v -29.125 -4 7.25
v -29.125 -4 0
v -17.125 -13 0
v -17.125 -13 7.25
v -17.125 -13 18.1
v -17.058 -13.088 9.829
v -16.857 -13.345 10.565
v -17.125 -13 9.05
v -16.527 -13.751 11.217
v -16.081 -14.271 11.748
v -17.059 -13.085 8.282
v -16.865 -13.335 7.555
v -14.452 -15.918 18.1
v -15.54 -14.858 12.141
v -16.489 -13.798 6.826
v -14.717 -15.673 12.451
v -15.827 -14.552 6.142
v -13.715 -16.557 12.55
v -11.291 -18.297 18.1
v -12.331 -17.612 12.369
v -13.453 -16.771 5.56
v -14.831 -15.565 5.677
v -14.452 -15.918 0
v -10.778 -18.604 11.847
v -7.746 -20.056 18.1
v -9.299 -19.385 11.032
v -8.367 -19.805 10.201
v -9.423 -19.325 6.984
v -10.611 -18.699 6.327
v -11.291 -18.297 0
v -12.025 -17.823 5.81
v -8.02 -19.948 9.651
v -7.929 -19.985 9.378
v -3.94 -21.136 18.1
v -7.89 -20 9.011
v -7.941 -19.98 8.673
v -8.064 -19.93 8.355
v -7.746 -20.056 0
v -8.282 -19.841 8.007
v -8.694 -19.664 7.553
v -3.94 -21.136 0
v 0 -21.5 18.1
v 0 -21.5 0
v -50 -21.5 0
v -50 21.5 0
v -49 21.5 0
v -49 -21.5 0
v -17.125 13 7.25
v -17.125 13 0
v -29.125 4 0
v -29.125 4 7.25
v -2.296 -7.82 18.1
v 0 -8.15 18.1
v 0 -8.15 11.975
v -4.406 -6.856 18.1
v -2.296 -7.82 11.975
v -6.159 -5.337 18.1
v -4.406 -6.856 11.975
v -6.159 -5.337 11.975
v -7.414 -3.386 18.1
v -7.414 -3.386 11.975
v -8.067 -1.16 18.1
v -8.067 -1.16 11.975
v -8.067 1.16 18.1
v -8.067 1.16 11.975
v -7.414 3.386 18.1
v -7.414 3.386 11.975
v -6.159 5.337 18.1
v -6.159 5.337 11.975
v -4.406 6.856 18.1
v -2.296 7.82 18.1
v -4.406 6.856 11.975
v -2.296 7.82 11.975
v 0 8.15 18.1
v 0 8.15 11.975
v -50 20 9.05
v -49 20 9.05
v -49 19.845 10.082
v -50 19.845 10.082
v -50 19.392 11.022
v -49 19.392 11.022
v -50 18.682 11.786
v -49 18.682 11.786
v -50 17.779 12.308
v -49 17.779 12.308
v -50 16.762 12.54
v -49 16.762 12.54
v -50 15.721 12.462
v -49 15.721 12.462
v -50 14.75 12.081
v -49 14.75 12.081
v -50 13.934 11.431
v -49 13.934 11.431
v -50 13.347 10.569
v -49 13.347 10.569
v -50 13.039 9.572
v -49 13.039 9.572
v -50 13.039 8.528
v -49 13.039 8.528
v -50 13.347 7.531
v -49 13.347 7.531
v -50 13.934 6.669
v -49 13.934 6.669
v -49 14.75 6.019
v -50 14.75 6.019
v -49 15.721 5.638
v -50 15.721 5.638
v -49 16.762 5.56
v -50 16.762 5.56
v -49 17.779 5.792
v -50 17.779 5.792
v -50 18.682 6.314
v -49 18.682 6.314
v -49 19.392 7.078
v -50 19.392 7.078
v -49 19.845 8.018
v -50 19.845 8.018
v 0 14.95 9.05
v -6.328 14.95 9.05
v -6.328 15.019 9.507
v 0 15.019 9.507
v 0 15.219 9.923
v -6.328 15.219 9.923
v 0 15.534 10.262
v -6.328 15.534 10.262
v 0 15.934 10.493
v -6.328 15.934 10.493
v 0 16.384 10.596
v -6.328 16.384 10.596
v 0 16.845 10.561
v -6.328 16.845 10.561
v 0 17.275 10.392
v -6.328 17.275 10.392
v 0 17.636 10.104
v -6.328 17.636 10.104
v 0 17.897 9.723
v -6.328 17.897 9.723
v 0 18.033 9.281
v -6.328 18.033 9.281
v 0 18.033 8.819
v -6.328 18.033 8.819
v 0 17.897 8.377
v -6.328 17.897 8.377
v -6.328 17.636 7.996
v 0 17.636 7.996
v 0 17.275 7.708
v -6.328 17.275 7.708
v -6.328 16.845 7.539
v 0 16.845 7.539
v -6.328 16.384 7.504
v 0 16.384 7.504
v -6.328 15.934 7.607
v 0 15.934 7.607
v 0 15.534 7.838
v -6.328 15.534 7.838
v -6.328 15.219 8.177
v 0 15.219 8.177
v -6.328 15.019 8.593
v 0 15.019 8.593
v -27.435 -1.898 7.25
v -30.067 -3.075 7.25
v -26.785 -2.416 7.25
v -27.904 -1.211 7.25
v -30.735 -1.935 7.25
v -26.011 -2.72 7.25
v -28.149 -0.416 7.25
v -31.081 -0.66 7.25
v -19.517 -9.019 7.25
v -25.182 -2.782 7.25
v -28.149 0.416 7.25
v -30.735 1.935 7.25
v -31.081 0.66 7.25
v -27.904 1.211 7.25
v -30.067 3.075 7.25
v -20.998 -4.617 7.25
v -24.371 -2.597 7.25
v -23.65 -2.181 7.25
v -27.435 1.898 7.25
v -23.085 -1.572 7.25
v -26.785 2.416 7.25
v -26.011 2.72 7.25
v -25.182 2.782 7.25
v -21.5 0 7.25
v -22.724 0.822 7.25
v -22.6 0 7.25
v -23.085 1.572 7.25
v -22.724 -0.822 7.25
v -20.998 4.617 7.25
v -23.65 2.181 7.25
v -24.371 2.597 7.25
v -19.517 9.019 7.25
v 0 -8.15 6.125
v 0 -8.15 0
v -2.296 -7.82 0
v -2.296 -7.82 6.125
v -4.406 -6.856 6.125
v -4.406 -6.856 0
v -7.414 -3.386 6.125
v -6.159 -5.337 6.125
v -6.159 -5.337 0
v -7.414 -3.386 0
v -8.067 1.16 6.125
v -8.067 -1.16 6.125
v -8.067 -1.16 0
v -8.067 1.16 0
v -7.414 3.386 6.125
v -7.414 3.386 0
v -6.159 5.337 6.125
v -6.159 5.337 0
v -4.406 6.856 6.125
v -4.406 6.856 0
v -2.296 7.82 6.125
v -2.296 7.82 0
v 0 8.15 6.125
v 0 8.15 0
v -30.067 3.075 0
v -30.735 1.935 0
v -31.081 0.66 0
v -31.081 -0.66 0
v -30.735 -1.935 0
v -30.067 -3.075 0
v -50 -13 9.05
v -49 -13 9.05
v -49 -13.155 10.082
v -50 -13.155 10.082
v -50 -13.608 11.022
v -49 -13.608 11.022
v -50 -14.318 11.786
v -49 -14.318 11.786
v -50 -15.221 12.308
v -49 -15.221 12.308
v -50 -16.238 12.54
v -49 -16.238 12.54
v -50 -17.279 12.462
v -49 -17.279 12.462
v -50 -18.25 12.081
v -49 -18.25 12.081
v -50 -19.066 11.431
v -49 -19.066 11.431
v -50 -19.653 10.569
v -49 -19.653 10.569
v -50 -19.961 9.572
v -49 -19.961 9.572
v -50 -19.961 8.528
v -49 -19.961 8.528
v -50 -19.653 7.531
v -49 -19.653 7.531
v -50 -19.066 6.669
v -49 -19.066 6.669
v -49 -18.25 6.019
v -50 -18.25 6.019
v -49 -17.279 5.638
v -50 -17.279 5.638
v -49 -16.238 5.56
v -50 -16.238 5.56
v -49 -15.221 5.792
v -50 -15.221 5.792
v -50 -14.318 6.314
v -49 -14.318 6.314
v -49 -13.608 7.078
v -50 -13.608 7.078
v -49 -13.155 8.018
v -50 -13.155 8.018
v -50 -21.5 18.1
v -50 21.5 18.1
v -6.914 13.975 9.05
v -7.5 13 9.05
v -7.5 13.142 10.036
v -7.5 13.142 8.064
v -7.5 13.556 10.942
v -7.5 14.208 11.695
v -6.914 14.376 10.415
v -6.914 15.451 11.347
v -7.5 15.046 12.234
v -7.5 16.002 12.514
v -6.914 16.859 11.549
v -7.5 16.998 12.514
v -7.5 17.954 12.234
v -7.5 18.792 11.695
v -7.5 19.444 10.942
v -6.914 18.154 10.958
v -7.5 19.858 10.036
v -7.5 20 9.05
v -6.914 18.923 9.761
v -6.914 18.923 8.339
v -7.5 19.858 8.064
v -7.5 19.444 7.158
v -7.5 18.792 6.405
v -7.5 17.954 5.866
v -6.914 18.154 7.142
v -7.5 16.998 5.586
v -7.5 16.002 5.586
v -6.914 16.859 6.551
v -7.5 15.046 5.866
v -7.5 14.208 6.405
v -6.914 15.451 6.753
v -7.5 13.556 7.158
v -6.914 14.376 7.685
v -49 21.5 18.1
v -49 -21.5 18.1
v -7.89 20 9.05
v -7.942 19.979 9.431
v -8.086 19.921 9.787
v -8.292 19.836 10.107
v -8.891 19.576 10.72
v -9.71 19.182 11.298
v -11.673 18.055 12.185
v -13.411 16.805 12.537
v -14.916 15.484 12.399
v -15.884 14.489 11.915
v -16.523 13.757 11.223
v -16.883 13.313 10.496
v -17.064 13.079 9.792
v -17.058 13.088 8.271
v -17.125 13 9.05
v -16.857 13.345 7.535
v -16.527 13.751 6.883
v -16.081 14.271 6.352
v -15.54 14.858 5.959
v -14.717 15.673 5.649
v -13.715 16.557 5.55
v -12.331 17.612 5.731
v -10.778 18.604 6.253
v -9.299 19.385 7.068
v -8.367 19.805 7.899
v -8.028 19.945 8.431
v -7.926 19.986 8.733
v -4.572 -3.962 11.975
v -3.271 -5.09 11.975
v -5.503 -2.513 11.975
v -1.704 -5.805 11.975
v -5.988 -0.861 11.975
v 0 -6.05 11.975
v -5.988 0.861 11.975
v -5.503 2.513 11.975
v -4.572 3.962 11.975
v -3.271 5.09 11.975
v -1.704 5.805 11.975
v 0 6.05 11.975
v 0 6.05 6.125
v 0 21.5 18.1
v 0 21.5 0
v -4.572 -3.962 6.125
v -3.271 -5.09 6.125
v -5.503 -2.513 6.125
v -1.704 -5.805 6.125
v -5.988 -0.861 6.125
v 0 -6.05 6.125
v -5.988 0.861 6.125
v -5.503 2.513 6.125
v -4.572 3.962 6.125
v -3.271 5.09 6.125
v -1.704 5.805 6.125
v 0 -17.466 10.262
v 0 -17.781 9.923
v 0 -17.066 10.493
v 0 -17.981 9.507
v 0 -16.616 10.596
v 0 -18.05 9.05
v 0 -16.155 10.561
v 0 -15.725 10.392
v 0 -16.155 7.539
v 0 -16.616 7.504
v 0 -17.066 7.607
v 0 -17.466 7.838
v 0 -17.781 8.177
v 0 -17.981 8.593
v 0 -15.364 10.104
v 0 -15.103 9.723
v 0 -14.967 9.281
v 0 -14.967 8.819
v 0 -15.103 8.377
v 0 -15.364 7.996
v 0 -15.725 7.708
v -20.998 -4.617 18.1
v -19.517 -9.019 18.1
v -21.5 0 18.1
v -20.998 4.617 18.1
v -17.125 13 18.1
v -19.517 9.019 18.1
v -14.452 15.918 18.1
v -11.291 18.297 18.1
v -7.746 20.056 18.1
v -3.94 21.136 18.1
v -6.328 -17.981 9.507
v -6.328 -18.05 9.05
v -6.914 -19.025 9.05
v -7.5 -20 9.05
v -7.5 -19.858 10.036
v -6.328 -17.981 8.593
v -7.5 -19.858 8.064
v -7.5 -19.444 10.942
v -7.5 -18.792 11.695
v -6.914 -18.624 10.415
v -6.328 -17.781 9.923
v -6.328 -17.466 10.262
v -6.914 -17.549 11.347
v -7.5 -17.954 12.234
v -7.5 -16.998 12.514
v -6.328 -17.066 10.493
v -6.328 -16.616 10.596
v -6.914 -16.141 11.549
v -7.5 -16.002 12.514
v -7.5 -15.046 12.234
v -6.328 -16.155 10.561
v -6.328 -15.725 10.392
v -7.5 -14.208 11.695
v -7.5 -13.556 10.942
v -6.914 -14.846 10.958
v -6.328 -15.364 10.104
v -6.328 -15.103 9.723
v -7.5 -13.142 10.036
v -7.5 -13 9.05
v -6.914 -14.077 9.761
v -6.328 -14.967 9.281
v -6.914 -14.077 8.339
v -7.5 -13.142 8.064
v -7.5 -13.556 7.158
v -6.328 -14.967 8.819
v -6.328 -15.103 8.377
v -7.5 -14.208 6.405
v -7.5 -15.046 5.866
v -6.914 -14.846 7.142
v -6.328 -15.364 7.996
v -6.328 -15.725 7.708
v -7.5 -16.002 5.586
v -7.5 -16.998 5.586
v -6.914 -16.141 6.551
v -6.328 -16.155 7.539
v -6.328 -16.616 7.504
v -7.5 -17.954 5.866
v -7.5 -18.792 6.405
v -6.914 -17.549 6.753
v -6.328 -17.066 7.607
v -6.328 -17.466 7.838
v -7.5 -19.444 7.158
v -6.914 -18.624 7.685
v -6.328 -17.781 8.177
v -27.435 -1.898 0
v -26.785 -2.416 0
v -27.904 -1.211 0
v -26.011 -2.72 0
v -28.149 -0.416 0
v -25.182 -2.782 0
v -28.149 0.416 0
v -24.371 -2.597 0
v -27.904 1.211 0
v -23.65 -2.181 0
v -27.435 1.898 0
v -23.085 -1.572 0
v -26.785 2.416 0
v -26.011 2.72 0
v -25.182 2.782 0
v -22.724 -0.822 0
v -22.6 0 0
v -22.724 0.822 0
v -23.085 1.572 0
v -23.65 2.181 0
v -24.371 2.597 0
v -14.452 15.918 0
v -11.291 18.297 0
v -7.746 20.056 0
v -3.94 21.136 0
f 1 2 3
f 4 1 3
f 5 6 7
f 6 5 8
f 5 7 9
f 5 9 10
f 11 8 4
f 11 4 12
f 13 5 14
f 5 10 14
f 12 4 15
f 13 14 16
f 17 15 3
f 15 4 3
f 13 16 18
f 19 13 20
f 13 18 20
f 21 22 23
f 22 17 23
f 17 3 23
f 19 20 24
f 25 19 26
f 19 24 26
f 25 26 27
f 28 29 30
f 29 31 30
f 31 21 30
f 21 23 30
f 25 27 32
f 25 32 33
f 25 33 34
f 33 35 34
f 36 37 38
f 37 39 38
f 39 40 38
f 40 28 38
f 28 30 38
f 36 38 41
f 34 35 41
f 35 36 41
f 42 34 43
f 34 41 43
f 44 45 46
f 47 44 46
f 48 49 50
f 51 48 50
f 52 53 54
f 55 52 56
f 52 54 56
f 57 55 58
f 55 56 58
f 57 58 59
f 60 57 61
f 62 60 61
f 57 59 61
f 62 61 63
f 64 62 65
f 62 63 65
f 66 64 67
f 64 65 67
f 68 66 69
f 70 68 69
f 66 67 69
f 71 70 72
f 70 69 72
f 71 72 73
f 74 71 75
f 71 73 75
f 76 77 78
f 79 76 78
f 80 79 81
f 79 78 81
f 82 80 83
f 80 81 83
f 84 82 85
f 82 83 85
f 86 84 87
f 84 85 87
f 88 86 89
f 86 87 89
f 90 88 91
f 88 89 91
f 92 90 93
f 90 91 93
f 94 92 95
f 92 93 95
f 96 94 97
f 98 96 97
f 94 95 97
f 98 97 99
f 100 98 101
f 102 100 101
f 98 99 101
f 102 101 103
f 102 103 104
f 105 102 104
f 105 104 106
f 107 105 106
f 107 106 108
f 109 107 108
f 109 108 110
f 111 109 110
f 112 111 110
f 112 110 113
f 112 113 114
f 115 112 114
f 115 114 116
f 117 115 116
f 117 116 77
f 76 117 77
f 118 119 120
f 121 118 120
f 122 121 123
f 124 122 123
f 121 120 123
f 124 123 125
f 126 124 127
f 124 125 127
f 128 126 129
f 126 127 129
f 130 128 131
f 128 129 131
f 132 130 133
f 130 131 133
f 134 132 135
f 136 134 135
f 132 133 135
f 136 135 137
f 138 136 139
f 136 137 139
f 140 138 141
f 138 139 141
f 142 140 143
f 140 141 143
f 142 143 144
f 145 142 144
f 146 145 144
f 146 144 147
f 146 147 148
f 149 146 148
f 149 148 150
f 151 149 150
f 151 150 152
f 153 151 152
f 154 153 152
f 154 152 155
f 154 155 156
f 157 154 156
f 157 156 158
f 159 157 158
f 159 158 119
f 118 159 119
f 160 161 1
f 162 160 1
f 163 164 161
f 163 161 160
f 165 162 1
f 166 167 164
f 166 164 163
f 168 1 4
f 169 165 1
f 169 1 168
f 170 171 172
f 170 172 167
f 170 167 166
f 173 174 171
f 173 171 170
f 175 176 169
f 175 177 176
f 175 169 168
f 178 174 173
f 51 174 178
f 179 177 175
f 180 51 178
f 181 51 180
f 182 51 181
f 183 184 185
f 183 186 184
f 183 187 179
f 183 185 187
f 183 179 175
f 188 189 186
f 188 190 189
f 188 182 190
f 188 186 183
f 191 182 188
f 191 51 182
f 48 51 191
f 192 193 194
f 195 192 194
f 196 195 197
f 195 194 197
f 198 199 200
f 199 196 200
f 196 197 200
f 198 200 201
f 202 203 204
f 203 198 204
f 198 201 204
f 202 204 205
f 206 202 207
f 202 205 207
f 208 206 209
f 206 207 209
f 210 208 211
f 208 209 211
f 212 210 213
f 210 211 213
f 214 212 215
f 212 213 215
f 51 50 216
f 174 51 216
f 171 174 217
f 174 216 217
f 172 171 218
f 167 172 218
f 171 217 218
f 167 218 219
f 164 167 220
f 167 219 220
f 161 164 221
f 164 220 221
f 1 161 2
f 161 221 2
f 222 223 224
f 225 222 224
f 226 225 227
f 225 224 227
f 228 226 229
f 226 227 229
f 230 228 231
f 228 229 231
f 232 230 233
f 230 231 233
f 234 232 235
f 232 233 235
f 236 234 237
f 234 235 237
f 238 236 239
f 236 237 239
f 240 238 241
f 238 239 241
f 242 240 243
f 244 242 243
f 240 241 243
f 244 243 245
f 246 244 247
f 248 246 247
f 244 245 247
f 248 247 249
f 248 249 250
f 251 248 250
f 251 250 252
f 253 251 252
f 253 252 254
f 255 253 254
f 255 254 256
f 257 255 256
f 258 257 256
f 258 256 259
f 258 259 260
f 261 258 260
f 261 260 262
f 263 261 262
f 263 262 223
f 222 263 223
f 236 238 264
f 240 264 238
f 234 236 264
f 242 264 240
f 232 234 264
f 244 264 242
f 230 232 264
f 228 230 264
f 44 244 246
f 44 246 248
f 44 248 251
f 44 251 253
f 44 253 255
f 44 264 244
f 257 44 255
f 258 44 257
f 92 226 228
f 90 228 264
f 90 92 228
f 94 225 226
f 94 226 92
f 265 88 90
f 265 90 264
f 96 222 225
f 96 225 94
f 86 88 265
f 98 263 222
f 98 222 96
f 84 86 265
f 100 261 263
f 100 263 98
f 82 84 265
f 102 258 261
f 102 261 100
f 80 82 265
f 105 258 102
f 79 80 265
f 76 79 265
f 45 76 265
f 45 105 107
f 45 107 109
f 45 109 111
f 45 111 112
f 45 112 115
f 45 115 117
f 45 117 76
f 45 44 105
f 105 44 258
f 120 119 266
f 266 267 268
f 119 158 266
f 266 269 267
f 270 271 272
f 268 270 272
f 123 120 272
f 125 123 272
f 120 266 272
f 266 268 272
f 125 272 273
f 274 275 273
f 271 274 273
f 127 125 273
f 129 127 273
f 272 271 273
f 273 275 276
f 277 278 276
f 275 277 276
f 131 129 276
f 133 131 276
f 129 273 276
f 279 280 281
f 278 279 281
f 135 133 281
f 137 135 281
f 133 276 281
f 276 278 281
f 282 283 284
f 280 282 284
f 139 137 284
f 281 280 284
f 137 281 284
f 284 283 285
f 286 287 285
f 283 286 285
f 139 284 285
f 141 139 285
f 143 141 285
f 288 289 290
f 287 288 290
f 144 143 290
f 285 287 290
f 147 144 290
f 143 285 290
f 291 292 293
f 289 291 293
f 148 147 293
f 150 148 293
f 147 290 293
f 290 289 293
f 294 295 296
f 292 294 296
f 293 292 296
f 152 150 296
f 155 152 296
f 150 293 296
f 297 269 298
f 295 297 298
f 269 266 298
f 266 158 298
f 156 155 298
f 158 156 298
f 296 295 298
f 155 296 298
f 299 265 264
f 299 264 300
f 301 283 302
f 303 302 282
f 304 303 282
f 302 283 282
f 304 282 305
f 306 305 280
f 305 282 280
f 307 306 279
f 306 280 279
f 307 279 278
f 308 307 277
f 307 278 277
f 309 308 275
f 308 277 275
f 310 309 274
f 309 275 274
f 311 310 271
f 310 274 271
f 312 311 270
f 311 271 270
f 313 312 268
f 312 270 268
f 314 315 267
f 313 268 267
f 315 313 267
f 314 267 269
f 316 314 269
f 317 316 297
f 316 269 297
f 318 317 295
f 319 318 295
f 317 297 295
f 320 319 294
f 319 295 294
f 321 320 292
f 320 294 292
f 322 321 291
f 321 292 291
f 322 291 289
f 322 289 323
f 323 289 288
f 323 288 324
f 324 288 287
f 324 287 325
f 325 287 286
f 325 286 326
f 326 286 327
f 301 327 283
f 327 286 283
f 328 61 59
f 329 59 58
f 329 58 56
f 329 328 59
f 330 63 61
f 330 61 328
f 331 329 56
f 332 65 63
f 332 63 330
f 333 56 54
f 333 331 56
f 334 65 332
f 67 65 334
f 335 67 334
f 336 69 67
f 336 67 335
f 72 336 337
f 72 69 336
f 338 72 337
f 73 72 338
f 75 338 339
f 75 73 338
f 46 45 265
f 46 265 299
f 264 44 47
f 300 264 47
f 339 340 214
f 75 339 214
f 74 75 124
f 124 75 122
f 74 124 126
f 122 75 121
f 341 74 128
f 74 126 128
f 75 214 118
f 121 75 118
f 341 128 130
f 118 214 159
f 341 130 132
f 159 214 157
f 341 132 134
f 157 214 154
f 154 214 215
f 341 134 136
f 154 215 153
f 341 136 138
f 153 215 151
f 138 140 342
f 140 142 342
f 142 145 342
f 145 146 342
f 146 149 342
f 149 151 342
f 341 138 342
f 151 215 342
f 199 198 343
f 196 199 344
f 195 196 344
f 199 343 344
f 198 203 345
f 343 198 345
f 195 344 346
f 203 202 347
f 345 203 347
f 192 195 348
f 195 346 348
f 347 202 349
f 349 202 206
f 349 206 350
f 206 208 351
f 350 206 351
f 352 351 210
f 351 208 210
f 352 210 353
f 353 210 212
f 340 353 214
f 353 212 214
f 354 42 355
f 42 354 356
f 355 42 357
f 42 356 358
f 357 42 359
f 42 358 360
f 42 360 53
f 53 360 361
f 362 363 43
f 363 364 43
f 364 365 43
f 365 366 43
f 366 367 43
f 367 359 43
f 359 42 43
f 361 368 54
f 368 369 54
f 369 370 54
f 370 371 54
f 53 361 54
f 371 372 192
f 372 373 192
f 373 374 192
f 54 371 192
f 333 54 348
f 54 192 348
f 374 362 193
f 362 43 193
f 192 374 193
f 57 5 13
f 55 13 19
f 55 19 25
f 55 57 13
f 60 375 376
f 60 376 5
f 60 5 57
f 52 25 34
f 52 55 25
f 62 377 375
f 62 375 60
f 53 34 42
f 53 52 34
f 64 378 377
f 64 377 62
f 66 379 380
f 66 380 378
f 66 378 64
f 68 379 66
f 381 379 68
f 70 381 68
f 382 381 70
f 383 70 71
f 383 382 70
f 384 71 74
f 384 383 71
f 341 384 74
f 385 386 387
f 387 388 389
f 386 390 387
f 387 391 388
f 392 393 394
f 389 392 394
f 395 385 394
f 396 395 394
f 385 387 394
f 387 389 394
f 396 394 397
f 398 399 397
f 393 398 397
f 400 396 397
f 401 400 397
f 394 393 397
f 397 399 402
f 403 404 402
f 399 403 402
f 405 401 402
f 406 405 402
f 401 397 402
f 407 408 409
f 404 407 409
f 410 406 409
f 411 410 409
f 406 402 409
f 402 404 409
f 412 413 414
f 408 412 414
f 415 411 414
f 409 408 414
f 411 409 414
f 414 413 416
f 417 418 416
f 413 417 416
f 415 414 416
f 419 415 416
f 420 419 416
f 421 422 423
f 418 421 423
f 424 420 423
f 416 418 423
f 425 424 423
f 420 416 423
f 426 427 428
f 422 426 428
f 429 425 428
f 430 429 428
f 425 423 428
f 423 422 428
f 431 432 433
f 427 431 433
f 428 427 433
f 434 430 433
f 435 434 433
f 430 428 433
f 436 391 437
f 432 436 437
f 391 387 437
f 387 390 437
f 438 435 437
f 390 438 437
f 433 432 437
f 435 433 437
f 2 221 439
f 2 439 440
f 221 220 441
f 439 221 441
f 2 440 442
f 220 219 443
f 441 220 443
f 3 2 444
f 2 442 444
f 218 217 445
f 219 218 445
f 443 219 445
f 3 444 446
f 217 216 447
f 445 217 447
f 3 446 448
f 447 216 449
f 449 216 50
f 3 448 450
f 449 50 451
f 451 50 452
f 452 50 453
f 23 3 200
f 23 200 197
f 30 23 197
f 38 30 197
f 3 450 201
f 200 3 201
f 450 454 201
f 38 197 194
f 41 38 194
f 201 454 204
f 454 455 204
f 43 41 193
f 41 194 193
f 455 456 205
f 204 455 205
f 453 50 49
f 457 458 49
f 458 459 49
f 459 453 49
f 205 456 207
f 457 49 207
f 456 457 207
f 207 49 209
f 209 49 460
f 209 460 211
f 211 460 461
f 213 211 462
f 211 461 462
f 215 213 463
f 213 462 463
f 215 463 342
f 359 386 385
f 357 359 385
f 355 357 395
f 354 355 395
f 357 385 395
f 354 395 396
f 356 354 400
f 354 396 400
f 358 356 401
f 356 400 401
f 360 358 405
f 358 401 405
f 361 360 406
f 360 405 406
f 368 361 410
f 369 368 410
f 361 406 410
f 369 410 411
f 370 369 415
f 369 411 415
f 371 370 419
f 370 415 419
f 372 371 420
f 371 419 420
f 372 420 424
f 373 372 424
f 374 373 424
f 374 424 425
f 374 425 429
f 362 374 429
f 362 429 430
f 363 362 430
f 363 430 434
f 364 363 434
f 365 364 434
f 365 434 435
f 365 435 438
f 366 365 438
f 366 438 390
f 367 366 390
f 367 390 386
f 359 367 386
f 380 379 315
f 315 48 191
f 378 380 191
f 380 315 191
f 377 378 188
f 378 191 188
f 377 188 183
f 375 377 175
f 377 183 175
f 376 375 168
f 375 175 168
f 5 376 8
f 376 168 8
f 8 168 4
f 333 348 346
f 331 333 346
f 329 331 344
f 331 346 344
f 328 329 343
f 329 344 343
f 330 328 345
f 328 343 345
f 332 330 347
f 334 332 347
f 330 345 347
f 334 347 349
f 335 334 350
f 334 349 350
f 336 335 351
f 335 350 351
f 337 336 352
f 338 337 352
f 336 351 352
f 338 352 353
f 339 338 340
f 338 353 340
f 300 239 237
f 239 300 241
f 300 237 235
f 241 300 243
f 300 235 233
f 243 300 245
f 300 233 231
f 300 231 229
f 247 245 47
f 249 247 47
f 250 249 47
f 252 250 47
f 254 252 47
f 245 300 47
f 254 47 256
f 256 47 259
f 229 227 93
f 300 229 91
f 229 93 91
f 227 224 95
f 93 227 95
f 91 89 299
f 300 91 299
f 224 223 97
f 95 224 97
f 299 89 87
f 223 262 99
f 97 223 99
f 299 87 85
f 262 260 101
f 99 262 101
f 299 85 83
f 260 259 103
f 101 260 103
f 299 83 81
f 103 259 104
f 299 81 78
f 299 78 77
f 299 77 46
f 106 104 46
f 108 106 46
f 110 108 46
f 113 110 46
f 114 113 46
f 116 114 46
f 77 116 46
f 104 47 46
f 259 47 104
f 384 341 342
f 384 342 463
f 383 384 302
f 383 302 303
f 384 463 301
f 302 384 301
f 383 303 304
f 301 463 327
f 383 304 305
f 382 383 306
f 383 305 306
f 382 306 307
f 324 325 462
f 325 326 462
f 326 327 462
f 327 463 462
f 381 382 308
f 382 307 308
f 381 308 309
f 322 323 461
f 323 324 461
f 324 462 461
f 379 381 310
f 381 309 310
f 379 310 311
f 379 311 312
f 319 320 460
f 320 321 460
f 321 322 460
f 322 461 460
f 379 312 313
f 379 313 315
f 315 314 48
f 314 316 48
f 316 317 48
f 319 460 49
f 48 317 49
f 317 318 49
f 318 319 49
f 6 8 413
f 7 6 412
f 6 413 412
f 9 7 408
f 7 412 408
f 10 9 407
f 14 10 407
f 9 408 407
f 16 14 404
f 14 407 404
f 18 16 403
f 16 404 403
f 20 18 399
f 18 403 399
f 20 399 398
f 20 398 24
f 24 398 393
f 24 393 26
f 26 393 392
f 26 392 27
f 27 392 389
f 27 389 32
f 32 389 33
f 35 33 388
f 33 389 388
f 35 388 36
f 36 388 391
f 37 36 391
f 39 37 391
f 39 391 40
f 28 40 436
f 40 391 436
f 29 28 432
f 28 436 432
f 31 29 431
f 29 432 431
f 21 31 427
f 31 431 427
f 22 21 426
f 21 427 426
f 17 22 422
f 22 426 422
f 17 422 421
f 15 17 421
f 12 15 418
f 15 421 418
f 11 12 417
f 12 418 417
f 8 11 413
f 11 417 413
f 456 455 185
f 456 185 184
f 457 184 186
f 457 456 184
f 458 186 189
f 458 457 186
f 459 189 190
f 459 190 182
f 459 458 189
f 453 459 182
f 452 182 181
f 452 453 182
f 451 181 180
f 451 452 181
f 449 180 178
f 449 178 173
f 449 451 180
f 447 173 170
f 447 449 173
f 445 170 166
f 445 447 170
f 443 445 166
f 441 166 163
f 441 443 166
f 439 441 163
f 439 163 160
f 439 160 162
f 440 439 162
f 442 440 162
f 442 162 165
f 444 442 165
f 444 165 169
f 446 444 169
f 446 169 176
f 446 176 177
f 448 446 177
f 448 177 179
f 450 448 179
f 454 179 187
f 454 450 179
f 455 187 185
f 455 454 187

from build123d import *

# Parameters (mm, degrees)
F1_DEPTH   = 18.1
F2_START   = 6.125
F2_DEPTH   = 5.85
F0_R       = 2.79
F3_DEPTH   = 7.25
F5_D       = 3.1
F0_W       = 1
F0_H       = 43
F6_DEPTH   = 18.1
F8_D       = 7
F8_DEPTH   = 42.5
F8_TIP     = 2.1030121666
F8_2_D     = 7
F8_2_DEPTH = 42.5
F8_2_TIP   = 2.1030121666


with BuildPart() as f1:
    # F0 (on Top) → F1 (new body)
    with BuildSketch(Plane.XY):
        with BuildLine():
            Line((0, 8.15), (0, 21.5))
            ThreePointArc((0, 21.5), (-9.5590271472, 19.2581151726), (-17.1245437895, 13))
            ThreePointArc((-17.1245437895, 13), (-21.5, 0), (-17.1245437895, -13))
            ThreePointArc((-17.1245437895, -13), (-9.5590271472, -19.2581151726), (0, -21.5))
            Line((0, -21.5), (0, -8.15))
            ThreePointArc((0, -8.15), (-8.15, 0), (0, 8.15))
        make_face()
    extrude(amount=F1_DEPTH)

    # F0 (on Top) → F2 (join)
    with BuildSketch(Plane.XY.offset(F2_START)):
        with BuildLine():
            Line((0, 6.05), (0, 8.15))
            ThreePointArc((0, 8.15), (-8.15, 0), (0, -8.15))
            Line((0, -8.15), (0, -6.05))
            ThreePointArc((0, -6.05), (-6.05, 0), (0, 6.05))
        make_face()
    extrude(amount=F2_DEPTH)

    # F0 (on Top) → F3 (join)
    with BuildSketch(Plane.XY):
        with BuildLine():
            ThreePointArc((-17.1245437895, -13), (-21.5, 0), (-17.1245437895, 13))
            Line((-17.1245437895, 13), (-29.1245437895, 4))
            Line((-29.1245437895, 4), (-29.1245437895, -4))
            Line((-29.1245437895, -4), (-17.1245437895, -13))
        make_face()
        with Locations((-25.39, 0)):
            Circle(F0_R, mode=Mode.SUBTRACT)
        with BuildLine():
            Line((-29.1245437895, -4), (-29.1245437895, 4))
            ThreePointArc((-29.1245437895, 4), (-31.1245437895, 0), (-29.1245437895, -4))
        make_face()
    extrude(amount=F3_DEPTH)

    # F5 (through all)
    with Locations(Plane.YZ):
        with Locations((-16.5, 9.05), (16.5, 9.05)):
            Hole(F5_D / 2)

    # F8
    with Locations(Plane(origin=(-50, 0, 0), x_dir=(0, -1, 0), z_dir=(-1, 0, 0))):
        with Locations((-16.5, 9.05), (16.5, 9.05)):
            Hole(F8_D / 2, depth=F8_DEPTH)
            with Locations((0, 0, -(F8_DEPTH + F8_TIP / 2))):  # 118° drill point
                Cone(0, F8_D / 2, F8_TIP, mode=Mode.SUBTRACT)


with BuildPart() as f6:
    # F0 (on Top) → F6 (new body)
    with BuildSketch(Plane.XY):
        with Locations((-49.5, 0)):
            Rectangle(F0_W, F0_H)
    extrude(amount=F6_DEPTH)

    # F8#2
    with Locations(Plane(origin=(-50, 0, 0), x_dir=(0, -1, 0), z_dir=(-1, 0, 0))):
        with Locations((-16.5, 9.05), (16.5, 9.05)):
            Hole(F8_2_D / 2, depth=F8_2_DEPTH)
            with Locations((0, 0, -(F8_2_DEPTH + F8_2_TIP / 2))):  # 118° drill point
                Cone(0, F8_2_D / 2, F8_2_TIP, mode=Mode.SUBTRACT)


solid = Compound([f1.part, f6.part])
